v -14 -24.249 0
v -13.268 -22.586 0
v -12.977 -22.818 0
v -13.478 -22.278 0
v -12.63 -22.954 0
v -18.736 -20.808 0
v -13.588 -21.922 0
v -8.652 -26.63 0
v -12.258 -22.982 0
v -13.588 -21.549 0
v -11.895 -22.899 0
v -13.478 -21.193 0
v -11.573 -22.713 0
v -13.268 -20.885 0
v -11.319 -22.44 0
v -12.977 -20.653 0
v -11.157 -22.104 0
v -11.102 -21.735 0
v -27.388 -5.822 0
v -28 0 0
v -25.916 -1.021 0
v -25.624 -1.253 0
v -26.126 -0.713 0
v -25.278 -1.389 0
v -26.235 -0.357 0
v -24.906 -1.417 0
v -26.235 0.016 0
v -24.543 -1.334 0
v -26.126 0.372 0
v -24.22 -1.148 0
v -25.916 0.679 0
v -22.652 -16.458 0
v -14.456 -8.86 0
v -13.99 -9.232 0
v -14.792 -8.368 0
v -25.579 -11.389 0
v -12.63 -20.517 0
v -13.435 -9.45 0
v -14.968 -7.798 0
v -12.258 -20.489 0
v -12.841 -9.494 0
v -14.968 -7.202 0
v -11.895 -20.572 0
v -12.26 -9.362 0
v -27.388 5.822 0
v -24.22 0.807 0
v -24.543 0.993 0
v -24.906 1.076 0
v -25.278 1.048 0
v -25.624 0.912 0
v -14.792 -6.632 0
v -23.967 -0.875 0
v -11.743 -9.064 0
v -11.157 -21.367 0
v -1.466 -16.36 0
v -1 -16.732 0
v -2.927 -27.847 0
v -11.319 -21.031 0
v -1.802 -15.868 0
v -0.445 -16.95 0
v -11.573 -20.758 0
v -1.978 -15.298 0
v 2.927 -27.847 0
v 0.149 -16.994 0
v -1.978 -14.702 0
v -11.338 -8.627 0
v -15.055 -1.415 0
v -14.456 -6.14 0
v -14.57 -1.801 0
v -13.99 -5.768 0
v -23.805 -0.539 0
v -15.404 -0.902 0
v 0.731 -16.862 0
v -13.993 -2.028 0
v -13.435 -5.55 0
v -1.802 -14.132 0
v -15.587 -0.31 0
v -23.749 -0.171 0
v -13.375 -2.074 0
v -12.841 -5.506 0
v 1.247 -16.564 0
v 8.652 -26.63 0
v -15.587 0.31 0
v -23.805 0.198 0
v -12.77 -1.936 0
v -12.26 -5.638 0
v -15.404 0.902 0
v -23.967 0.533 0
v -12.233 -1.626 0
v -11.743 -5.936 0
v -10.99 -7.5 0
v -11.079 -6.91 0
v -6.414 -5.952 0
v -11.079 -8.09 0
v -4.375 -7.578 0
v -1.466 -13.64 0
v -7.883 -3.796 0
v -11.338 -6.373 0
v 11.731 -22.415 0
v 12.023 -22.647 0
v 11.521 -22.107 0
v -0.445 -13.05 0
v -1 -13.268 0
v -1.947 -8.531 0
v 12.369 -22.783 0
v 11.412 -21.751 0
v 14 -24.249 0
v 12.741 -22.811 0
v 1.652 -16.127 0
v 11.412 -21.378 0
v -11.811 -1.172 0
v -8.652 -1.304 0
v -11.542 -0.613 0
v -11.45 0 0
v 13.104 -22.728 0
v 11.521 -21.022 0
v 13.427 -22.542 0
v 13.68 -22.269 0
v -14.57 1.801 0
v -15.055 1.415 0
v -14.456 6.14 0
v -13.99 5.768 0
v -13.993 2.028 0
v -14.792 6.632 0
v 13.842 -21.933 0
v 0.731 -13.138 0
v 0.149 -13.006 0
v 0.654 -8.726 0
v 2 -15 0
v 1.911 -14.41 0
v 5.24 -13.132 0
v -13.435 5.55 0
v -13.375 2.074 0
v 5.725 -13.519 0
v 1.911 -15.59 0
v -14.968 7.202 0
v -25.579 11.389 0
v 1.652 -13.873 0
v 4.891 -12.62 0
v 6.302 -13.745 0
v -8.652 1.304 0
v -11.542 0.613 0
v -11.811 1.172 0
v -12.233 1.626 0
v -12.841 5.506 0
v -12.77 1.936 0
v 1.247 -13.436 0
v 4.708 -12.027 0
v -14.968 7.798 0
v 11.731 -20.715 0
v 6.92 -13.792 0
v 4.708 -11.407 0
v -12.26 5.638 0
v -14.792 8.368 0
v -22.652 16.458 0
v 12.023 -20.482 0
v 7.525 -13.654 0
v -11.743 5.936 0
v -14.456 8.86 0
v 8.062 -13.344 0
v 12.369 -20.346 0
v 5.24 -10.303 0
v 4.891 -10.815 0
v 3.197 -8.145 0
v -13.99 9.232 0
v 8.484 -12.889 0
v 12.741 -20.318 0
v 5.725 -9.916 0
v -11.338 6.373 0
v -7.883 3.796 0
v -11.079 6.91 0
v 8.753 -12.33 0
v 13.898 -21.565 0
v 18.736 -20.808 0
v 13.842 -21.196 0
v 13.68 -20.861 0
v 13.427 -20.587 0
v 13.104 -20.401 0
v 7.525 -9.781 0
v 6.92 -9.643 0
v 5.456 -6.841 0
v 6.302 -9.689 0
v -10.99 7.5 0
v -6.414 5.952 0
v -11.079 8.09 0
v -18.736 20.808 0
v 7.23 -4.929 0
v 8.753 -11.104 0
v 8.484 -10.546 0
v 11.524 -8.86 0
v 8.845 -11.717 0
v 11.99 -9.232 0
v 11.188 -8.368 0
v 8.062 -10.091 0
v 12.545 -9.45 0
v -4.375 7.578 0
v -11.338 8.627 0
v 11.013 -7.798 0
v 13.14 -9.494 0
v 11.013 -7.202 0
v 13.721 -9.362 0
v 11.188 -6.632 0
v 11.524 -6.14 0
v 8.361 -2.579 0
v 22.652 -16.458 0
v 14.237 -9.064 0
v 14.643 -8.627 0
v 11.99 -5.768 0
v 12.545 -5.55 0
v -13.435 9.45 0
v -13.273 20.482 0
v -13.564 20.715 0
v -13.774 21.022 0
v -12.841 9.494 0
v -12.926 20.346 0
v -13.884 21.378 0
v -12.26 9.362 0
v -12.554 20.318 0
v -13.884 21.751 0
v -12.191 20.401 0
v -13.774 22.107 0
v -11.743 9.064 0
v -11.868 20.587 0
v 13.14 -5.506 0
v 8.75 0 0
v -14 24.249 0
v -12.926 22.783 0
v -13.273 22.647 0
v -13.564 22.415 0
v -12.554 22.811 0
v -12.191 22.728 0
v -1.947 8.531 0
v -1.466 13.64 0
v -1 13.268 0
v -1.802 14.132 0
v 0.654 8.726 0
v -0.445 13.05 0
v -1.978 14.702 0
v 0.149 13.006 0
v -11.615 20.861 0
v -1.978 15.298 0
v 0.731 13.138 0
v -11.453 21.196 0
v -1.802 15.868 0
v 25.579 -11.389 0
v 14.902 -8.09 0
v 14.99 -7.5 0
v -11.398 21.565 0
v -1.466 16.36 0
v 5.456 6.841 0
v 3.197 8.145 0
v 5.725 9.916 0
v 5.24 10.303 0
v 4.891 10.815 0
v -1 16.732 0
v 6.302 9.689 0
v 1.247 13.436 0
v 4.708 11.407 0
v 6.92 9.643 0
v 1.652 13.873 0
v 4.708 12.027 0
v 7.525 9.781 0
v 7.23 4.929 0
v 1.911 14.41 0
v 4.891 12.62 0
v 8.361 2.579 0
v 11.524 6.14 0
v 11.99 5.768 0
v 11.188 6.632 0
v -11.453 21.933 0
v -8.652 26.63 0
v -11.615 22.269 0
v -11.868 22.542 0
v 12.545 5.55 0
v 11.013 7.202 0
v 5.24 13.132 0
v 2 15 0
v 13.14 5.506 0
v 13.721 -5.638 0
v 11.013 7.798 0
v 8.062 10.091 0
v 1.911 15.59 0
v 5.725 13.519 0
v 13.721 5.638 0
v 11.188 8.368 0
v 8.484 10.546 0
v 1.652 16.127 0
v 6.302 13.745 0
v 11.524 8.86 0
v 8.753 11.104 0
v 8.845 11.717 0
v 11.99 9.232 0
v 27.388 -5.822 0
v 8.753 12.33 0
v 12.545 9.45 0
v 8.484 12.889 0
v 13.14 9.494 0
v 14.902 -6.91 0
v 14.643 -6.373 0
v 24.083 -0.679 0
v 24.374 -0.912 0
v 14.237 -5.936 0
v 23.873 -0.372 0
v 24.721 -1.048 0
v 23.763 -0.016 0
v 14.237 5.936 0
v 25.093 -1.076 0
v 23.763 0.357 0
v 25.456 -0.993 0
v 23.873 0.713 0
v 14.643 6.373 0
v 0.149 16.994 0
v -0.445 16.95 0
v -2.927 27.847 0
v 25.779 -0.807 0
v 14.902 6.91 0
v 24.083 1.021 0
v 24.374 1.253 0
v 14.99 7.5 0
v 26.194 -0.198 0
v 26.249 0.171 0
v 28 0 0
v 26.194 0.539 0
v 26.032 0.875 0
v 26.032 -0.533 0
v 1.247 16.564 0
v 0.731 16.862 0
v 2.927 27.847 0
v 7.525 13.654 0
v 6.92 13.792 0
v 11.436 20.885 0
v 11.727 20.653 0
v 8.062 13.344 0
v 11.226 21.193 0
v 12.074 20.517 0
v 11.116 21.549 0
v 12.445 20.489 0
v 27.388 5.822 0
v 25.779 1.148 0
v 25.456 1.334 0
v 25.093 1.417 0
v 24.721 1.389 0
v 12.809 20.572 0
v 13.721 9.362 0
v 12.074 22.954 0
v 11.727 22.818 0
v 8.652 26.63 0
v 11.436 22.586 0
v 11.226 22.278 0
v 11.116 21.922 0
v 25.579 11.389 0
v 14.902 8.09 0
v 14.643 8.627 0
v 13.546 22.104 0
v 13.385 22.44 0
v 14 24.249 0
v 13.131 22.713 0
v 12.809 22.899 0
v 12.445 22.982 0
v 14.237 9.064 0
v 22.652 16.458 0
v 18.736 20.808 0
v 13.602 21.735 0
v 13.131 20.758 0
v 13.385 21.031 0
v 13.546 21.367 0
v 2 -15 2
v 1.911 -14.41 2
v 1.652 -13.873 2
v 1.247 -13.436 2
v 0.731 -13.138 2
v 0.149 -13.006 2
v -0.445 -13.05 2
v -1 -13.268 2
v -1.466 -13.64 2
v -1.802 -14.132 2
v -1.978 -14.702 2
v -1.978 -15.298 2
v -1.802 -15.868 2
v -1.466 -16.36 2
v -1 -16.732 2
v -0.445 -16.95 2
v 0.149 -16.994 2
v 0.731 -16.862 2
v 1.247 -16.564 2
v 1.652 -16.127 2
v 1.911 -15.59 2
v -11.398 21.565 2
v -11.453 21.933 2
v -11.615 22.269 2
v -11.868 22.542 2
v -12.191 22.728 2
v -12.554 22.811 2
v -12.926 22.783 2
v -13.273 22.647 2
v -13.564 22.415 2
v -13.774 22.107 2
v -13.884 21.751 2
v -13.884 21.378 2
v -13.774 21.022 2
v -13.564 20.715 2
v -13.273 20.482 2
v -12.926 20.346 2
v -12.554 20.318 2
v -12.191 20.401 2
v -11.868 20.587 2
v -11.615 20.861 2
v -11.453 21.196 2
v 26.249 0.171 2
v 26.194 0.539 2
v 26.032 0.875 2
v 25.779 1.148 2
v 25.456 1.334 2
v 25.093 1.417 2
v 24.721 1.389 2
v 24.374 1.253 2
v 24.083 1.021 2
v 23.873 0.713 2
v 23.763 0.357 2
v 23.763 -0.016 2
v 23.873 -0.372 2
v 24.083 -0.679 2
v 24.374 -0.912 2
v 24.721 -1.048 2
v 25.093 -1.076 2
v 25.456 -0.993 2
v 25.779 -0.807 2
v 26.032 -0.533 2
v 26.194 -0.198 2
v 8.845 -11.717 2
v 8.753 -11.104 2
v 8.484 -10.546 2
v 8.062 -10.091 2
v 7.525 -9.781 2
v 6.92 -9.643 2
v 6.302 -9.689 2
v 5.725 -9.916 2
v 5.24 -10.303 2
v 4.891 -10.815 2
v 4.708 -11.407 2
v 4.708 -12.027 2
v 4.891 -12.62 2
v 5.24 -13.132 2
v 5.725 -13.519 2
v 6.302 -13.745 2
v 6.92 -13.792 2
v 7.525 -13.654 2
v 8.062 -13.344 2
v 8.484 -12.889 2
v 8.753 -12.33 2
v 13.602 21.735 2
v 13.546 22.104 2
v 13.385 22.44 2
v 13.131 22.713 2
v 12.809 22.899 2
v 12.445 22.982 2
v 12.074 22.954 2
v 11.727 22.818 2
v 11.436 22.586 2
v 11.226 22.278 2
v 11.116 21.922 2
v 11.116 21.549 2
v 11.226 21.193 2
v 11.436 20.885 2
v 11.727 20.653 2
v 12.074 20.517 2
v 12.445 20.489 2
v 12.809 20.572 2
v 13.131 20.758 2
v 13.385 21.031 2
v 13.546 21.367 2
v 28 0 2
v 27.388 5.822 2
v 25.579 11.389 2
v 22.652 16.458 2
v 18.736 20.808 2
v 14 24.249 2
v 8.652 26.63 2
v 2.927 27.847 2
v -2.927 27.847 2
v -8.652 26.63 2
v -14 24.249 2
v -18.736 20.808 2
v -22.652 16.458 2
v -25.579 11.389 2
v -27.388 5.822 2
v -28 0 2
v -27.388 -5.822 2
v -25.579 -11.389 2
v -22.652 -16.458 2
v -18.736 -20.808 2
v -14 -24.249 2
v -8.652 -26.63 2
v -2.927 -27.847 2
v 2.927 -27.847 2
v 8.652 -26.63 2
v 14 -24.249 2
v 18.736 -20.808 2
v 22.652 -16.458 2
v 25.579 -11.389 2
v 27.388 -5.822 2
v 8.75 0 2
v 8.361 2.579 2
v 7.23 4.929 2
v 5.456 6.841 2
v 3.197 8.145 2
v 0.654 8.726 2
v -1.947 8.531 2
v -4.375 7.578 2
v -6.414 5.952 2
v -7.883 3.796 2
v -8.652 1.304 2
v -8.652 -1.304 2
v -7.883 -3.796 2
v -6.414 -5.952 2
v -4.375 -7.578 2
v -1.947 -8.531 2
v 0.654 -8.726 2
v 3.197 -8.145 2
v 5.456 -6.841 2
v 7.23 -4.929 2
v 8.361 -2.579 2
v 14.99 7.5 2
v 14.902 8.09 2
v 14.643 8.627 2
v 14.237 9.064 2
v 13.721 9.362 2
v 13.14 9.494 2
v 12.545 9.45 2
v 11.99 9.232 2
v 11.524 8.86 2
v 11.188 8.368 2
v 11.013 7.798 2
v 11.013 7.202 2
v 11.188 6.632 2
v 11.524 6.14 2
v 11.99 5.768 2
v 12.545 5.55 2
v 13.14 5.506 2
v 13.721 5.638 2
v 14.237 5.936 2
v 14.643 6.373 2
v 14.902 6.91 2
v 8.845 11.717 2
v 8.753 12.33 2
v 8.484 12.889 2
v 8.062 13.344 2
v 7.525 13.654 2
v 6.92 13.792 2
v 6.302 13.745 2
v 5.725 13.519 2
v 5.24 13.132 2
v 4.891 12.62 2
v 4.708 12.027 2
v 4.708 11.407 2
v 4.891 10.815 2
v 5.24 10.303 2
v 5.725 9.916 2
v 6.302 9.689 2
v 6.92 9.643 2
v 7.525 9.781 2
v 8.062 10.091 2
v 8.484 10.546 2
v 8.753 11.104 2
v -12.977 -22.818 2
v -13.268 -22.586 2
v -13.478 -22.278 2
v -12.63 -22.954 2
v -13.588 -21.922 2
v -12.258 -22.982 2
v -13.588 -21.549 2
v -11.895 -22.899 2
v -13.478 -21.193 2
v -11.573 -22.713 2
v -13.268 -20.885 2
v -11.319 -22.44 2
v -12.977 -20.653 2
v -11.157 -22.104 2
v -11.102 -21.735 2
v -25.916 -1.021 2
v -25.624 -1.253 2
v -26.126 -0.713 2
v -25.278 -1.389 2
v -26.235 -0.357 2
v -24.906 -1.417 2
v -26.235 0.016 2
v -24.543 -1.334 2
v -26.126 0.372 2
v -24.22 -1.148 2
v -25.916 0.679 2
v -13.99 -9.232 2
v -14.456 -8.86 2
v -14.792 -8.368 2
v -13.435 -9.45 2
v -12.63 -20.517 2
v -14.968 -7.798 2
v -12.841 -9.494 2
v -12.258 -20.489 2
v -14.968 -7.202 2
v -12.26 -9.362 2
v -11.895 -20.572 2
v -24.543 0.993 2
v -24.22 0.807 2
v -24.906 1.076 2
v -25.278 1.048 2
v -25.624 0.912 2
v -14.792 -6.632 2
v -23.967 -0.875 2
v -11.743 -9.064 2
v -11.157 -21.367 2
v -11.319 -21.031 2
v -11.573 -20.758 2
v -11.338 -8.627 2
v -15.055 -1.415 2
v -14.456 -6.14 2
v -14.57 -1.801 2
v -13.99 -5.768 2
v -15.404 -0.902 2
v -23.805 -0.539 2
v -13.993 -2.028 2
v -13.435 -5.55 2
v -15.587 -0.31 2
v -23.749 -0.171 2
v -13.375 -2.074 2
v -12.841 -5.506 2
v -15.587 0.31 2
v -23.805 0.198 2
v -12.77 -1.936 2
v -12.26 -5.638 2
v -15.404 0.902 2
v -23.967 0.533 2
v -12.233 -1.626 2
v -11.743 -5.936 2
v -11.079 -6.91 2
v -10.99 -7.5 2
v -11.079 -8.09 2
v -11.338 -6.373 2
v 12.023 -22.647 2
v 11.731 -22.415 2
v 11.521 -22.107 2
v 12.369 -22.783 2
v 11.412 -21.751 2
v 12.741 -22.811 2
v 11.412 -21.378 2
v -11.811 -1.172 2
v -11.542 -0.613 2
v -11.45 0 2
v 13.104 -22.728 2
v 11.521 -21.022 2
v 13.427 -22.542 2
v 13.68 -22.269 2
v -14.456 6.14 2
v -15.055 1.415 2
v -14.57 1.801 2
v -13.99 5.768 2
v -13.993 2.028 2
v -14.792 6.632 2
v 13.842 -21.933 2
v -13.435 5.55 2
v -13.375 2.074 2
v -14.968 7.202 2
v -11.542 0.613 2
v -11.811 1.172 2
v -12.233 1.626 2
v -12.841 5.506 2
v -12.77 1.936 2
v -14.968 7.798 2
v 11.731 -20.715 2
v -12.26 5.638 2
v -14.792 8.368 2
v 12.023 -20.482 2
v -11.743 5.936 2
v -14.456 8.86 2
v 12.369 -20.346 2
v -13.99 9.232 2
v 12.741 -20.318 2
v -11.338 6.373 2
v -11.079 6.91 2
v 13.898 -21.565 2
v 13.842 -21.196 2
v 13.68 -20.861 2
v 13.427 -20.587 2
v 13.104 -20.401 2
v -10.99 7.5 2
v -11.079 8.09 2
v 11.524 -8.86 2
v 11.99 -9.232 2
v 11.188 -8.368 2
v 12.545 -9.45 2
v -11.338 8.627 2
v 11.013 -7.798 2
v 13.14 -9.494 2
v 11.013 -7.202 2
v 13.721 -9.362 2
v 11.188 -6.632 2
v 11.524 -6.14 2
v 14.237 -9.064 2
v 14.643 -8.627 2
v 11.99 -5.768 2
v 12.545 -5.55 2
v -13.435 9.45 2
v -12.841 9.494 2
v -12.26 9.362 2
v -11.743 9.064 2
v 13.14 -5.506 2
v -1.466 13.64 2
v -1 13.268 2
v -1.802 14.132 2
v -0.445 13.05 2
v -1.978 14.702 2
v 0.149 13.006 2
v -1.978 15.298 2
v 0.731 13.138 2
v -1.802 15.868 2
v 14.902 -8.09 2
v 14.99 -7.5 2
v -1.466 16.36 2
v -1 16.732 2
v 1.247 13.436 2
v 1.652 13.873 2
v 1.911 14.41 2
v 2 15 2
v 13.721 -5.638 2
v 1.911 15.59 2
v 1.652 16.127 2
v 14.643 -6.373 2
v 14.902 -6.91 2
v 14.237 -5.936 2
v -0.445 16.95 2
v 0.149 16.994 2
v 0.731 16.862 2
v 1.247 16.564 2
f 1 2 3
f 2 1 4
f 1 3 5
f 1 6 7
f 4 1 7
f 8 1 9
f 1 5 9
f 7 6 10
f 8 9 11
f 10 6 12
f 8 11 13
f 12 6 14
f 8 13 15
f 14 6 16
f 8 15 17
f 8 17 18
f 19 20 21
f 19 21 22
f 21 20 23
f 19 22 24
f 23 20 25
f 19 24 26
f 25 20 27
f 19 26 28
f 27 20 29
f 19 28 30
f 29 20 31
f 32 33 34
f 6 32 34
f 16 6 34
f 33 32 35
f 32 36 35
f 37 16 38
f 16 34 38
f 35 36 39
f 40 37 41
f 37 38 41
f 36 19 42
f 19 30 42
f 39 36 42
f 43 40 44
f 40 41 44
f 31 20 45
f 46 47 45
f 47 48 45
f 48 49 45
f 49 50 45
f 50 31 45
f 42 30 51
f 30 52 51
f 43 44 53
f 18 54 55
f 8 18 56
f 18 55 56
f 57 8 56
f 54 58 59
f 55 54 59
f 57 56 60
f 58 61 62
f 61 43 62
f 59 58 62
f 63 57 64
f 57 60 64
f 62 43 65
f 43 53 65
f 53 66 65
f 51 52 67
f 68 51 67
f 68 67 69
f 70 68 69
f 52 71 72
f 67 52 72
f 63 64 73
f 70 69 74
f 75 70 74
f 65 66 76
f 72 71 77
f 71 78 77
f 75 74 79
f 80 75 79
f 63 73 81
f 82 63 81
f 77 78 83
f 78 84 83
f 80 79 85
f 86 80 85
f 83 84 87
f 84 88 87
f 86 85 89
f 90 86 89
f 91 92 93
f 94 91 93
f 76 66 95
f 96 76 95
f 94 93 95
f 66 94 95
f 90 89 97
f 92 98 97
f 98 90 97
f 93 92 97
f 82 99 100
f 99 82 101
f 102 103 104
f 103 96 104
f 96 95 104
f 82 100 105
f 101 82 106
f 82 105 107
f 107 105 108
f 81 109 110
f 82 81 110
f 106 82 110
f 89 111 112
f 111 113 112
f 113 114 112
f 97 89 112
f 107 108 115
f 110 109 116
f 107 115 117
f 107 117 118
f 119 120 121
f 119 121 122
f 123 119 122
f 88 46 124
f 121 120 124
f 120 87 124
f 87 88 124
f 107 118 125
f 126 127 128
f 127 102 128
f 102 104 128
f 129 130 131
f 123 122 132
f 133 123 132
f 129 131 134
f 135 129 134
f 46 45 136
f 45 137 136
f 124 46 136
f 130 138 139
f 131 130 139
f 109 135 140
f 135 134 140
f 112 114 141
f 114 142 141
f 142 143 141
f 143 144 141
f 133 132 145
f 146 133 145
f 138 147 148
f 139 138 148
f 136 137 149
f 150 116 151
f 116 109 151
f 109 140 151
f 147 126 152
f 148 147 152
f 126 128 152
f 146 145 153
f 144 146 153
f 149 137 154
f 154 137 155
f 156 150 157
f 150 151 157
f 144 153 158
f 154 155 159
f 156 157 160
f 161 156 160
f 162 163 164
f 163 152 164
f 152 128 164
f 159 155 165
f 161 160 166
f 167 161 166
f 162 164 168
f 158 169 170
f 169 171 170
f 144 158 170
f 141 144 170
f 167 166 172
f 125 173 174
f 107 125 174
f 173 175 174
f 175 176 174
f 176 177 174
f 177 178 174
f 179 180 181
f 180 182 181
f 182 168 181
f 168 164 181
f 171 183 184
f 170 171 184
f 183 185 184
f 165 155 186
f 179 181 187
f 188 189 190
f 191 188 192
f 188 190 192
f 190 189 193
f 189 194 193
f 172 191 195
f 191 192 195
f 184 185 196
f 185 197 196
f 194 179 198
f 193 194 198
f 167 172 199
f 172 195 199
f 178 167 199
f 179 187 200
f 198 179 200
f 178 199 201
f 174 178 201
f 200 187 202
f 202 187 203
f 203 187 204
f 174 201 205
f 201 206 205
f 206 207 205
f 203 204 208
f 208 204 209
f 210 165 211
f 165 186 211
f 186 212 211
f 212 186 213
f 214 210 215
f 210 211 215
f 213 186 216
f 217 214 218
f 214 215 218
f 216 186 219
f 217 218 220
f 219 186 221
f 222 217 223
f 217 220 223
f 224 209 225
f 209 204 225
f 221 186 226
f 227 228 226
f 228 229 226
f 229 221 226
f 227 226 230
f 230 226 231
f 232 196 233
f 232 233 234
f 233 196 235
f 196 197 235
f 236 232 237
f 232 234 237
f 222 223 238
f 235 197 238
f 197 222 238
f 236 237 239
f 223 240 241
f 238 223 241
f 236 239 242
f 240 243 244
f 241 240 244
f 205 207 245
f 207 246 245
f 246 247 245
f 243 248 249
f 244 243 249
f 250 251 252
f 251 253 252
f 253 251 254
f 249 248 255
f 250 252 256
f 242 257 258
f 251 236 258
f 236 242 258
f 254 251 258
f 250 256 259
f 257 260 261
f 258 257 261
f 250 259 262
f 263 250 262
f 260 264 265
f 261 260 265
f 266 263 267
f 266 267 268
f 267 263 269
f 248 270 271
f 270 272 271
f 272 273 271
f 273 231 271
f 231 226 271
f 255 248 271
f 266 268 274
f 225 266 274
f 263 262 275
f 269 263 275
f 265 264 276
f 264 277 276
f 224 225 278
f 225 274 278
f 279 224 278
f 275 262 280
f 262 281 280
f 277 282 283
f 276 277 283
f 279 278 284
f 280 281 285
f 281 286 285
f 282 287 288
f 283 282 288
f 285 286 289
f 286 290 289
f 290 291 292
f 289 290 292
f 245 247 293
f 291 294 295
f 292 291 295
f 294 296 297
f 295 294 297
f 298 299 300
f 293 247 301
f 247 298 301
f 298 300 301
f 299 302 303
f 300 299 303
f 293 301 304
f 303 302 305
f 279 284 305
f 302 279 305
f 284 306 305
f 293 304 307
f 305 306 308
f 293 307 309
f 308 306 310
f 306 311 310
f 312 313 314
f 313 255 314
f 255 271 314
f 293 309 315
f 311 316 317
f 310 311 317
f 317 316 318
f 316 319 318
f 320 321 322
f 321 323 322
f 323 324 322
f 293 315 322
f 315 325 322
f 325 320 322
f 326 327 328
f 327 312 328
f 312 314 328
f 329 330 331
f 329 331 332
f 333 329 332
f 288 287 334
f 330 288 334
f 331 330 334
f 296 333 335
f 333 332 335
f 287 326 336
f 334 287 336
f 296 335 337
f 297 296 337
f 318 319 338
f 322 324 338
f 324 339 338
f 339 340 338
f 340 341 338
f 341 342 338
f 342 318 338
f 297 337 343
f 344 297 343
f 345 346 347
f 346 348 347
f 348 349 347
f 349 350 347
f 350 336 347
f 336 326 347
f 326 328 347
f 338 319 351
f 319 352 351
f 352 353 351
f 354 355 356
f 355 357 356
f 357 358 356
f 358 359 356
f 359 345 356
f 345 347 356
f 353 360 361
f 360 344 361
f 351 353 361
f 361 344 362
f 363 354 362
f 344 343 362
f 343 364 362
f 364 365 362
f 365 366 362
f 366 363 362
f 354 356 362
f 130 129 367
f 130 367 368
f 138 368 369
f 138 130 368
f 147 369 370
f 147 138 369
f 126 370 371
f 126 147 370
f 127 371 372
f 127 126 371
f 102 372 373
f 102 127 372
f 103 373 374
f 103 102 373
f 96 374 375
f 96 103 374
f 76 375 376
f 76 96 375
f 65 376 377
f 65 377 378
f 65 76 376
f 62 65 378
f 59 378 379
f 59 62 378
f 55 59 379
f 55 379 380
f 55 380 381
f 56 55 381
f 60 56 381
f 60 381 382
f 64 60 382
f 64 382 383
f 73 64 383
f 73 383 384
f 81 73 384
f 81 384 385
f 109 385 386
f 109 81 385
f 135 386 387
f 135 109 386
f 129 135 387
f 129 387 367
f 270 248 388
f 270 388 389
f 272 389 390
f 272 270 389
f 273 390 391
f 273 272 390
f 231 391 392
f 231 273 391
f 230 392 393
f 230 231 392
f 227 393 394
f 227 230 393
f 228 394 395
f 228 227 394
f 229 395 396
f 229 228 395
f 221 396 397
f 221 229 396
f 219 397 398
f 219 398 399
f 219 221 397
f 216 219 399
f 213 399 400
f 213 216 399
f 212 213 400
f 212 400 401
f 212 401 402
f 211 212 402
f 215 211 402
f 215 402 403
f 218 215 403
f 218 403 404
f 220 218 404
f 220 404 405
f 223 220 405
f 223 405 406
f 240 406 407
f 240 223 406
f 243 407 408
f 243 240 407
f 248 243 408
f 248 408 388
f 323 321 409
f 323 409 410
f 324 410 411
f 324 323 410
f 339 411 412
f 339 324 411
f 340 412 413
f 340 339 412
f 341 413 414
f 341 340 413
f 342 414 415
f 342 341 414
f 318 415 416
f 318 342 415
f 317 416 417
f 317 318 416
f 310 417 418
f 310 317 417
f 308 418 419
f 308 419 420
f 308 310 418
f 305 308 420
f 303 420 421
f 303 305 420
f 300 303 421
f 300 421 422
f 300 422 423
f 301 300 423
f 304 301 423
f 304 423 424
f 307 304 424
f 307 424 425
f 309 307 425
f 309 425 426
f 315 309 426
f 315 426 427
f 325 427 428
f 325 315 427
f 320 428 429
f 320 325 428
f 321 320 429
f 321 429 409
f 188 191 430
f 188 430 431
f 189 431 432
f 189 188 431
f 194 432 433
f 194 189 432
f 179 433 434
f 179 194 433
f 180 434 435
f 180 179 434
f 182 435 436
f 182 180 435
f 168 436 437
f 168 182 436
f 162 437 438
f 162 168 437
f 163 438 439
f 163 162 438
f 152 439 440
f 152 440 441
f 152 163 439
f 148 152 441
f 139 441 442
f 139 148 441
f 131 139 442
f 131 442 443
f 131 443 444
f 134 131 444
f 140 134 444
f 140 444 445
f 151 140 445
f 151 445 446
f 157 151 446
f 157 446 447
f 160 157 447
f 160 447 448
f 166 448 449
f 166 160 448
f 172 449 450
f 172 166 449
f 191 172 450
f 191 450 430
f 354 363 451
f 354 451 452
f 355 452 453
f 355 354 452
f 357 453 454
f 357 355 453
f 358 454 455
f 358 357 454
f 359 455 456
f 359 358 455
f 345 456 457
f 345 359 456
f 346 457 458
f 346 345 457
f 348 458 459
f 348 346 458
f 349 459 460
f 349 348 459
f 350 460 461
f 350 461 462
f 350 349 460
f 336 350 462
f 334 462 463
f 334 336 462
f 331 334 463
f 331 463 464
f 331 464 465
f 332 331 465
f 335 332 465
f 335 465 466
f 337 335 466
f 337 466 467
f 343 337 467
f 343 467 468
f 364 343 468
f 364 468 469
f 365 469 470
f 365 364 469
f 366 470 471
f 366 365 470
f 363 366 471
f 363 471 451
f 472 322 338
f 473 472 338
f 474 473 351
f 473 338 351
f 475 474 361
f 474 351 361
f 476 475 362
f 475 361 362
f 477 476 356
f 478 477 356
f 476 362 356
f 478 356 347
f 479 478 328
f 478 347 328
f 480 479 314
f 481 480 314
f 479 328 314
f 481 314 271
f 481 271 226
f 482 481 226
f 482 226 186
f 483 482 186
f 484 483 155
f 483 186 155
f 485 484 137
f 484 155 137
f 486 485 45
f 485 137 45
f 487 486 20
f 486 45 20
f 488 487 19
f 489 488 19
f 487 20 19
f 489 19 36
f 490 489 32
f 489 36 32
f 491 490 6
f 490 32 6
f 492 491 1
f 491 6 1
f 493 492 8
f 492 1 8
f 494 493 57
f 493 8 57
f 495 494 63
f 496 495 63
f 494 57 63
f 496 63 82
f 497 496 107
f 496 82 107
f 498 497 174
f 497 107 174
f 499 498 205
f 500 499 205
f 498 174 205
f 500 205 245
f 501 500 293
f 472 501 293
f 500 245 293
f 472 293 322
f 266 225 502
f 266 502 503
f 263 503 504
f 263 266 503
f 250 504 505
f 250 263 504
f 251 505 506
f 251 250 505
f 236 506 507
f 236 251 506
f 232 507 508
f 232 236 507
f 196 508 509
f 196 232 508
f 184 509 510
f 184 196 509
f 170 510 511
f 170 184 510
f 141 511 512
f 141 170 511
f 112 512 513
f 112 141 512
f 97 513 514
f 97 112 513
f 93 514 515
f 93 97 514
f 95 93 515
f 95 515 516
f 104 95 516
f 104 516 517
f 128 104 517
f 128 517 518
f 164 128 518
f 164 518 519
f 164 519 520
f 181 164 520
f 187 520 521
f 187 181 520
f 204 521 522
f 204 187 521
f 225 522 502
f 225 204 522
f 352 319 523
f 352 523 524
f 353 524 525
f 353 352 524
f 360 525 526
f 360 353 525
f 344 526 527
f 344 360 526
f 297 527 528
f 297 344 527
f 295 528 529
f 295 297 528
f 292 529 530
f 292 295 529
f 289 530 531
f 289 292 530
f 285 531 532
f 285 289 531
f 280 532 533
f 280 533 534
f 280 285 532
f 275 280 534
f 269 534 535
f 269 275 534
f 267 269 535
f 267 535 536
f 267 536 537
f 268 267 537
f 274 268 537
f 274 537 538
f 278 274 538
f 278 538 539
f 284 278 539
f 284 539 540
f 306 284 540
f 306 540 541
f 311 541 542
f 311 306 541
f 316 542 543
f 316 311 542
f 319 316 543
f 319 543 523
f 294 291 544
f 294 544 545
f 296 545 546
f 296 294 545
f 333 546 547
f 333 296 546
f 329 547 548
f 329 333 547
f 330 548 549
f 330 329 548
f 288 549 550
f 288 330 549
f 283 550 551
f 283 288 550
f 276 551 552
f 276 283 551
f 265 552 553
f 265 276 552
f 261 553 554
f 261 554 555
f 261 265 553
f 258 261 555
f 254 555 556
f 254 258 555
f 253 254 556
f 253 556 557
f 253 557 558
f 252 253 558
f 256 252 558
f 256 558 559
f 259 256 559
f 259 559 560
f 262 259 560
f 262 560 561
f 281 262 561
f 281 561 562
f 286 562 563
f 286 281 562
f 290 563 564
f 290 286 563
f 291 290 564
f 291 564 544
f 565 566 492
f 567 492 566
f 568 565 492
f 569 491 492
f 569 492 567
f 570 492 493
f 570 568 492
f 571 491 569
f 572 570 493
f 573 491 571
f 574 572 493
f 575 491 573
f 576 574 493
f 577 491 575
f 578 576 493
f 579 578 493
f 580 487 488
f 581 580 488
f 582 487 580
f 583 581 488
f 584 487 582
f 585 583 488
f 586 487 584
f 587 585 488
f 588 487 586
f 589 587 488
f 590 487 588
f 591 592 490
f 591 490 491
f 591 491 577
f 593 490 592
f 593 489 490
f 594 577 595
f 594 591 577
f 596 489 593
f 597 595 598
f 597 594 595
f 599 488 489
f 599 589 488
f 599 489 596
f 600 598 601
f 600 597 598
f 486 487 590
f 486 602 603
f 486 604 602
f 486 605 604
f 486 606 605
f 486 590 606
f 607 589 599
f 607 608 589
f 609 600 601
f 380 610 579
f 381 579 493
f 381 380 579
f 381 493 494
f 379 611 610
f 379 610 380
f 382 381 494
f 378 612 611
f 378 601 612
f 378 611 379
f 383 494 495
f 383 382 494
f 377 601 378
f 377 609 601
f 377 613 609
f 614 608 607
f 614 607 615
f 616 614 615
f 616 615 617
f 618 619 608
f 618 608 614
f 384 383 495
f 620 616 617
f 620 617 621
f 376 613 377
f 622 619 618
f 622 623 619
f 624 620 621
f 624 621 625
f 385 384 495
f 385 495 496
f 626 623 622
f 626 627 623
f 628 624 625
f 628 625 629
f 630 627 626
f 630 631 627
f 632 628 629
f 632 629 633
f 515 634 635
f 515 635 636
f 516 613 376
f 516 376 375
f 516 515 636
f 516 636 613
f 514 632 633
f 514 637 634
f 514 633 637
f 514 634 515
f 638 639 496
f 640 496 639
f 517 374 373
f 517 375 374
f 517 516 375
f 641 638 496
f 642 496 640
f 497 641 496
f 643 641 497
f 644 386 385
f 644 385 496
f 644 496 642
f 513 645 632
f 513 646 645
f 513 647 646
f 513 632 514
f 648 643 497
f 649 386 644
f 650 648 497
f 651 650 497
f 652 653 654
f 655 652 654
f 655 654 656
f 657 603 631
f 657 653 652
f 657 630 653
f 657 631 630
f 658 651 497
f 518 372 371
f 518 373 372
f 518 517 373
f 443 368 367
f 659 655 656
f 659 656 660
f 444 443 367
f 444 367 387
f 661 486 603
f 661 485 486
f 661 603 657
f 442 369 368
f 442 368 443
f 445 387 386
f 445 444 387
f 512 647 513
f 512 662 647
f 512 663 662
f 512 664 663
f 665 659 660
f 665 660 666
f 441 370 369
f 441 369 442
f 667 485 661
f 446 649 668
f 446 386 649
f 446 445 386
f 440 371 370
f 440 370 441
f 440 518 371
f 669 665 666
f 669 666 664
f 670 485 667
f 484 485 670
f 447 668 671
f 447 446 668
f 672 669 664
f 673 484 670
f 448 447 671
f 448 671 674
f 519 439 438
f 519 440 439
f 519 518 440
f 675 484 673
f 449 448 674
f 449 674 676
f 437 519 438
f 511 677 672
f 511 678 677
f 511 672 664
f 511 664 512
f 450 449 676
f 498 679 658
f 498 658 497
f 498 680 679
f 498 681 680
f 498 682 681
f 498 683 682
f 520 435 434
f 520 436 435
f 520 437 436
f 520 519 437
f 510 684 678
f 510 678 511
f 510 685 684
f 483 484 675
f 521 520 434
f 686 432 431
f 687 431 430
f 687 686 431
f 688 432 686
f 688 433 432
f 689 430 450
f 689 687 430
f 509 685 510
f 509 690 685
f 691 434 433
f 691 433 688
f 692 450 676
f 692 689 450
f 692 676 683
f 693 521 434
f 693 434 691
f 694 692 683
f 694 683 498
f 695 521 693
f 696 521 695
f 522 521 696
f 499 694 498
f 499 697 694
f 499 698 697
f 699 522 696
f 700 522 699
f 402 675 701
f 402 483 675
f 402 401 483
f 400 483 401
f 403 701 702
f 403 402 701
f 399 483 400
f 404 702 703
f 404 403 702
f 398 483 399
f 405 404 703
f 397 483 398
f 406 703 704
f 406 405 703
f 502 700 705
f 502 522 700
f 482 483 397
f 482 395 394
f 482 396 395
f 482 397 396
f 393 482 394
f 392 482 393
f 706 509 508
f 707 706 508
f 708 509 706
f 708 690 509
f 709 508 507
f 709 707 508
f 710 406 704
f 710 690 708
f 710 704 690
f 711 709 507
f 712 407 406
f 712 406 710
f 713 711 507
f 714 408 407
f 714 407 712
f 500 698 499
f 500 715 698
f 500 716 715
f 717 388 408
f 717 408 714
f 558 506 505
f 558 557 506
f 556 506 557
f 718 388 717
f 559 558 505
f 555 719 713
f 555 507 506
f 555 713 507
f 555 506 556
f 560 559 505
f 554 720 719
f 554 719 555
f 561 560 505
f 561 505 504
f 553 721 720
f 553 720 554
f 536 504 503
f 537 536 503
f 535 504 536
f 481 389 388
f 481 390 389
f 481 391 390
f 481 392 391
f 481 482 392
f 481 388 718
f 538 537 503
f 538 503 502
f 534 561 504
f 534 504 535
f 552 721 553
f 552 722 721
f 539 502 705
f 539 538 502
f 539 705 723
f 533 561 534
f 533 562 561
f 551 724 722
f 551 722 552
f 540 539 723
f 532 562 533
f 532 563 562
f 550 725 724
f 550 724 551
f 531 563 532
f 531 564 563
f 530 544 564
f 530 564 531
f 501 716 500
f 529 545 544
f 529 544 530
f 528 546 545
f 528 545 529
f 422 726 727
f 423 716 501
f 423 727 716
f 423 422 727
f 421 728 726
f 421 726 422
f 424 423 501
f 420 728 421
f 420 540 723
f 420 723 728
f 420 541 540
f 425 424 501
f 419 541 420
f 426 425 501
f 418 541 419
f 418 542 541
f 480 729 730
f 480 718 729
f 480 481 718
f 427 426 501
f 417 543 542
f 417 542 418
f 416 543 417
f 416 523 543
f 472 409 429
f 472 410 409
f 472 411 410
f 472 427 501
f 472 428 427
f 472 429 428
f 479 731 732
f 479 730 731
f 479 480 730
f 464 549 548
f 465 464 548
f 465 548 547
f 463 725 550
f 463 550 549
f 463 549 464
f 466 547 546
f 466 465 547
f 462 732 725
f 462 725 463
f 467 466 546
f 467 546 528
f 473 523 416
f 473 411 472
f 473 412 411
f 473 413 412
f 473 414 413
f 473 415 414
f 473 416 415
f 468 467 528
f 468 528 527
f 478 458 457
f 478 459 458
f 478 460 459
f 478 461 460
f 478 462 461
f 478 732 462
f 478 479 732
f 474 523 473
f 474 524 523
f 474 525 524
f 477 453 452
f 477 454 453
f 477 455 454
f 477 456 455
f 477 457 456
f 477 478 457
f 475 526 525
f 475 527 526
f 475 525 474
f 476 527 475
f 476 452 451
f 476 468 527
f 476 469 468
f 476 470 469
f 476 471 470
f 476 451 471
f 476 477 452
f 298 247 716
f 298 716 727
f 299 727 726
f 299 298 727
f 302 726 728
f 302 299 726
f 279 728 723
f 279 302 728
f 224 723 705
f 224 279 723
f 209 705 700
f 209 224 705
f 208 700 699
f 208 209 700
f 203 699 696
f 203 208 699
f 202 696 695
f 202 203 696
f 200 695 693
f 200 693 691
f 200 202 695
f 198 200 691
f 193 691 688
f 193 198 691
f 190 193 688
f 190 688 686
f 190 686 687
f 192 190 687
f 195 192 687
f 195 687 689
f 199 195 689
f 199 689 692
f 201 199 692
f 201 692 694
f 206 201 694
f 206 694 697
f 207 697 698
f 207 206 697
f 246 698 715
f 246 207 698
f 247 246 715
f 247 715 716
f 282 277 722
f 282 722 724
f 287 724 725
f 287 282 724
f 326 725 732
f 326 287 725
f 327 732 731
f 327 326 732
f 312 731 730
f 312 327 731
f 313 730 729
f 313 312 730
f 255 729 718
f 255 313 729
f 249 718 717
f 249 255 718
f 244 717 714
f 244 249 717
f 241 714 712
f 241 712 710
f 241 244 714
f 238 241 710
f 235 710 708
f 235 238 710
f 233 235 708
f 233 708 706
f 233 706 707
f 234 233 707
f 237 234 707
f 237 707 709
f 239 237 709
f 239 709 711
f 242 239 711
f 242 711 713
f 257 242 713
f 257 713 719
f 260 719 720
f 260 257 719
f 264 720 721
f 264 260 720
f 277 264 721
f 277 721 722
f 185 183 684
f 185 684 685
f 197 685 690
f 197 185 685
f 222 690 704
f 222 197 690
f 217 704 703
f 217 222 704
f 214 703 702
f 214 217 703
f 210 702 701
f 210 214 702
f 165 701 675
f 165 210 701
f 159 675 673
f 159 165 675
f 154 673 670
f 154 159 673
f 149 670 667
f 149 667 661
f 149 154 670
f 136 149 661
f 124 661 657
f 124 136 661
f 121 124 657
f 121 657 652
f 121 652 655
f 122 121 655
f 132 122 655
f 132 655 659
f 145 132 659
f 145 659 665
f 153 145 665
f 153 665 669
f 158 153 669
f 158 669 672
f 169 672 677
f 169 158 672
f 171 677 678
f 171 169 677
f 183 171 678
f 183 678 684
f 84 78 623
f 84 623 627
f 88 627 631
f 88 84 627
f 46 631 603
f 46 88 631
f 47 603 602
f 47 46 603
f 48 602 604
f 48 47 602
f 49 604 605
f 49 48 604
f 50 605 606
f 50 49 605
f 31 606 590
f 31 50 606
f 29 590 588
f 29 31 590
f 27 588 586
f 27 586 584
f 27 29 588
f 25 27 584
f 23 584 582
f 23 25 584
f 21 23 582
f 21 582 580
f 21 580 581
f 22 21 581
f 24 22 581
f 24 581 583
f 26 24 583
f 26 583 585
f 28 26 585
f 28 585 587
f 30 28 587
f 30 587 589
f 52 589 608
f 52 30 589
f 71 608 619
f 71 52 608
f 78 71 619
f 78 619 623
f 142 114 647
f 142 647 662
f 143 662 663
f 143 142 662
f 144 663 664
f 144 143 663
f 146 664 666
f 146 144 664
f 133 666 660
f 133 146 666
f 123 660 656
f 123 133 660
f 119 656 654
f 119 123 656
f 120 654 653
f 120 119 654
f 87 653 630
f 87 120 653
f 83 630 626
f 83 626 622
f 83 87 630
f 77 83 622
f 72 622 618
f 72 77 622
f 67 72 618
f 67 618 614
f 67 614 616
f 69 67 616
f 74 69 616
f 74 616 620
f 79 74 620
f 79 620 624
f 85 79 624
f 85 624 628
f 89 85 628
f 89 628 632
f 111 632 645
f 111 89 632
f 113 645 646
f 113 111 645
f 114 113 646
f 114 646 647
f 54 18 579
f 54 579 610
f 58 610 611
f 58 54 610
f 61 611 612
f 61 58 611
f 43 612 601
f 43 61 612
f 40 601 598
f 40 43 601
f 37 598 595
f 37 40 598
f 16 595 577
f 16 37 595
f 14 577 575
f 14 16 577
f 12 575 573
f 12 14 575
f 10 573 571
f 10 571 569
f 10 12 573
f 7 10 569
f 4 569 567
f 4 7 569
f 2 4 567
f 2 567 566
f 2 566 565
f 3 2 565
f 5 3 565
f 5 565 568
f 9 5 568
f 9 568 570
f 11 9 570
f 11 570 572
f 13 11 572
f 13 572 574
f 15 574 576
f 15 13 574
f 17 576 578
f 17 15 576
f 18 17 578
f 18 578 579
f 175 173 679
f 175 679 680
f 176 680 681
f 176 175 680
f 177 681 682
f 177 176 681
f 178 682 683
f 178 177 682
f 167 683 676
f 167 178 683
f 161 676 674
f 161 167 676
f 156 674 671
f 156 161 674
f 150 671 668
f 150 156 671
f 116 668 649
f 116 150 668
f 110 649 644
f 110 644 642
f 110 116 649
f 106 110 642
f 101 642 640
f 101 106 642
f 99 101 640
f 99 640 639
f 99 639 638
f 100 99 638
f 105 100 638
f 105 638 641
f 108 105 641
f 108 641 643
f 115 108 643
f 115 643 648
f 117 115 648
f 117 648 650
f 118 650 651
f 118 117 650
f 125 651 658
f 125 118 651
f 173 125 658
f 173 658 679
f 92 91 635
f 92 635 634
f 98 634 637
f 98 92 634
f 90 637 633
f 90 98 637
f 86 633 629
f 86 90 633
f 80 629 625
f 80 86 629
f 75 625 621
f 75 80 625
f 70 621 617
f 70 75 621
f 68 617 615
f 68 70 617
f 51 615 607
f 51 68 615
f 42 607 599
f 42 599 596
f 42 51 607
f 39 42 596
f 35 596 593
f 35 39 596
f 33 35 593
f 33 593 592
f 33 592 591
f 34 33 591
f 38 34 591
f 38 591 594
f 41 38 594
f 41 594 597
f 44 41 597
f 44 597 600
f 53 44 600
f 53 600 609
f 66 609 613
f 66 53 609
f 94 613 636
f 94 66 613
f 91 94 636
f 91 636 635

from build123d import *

# Parameters (mm, degrees)
SKETCH_1_R      = 28
SKETCH_1_R_2    = 2
SKETCH_1_R_3    = 2.08
SKETCH_1_R_4    = 8.75
SKETCH_1_R_5    = 1.25
EXTRUDE_1_DEPTH = 2


with BuildPart() as part:
    # 草图1 → 凸台-拉伸1 (new body)
    with BuildSketch(Plane.XY):
        Circle(SKETCH_1_R)
        with Locations((0, -15)):
            Circle(SKETCH_1_R_2, mode=Mode.SUBTRACT)
        with Locations((-12.990381057, -7.5)):
            Circle(SKETCH_1_R_2, mode=Mode.SUBTRACT)
        with Locations((-12.990381057, 7.5)):
            Circle(SKETCH_1_R_2, mode=Mode.SUBTRACT)
        with Locations((0, 15)):
            Circle(SKETCH_1_R_2, mode=Mode.SUBTRACT)
        with Locations((12.990381057, 7.5)):
            Circle(SKETCH_1_R_2, mode=Mode.SUBTRACT)
        with Locations((12.990381057, -7.5)):
            Circle(SKETCH_1_R_2, mode=Mode.SUBTRACT)
        with Locations((-13.53, 0)):
            Circle(SKETCH_1_R_3, mode=Mode.SUBTRACT)
        with Locations((6.765, 11.717323713)):
            Circle(SKETCH_1_R_3, mode=Mode.SUBTRACT)
        with Locations((6.765, -11.717323713)):
            Circle(SKETCH_1_R_3, mode=Mode.SUBTRACT)
        Circle(SKETCH_1_R_4, mode=Mode.SUBTRACT)
        with Locations((12.351862398, 21.735489304)):
            Circle(SKETCH_1_R_5, mode=Mode.SUBTRACT)
        with Locations((24.9994171, 0.170718032)):
            Circle(SKETCH_1_R_5, mode=Mode.SUBTRACT)
        with Locations((12.647554702, -21.564771273)):
            Circle(SKETCH_1_R_5, mode=Mode.SUBTRACT)
        with Locations((-12.351862398, -21.735489304)):
            Circle(SKETCH_1_R_5, mode=Mode.SUBTRACT)
        with Locations((-24.9994171, -0.170718032)):
            Circle(SKETCH_1_R_5, mode=Mode.SUBTRACT)
        with Locations((-12.647554702, 21.564771273)):
            Circle(SKETCH_1_R_5, mode=Mode.SUBTRACT)
    extrude(amount=EXTRUDE_1_DEPTH)


solid = part.part
